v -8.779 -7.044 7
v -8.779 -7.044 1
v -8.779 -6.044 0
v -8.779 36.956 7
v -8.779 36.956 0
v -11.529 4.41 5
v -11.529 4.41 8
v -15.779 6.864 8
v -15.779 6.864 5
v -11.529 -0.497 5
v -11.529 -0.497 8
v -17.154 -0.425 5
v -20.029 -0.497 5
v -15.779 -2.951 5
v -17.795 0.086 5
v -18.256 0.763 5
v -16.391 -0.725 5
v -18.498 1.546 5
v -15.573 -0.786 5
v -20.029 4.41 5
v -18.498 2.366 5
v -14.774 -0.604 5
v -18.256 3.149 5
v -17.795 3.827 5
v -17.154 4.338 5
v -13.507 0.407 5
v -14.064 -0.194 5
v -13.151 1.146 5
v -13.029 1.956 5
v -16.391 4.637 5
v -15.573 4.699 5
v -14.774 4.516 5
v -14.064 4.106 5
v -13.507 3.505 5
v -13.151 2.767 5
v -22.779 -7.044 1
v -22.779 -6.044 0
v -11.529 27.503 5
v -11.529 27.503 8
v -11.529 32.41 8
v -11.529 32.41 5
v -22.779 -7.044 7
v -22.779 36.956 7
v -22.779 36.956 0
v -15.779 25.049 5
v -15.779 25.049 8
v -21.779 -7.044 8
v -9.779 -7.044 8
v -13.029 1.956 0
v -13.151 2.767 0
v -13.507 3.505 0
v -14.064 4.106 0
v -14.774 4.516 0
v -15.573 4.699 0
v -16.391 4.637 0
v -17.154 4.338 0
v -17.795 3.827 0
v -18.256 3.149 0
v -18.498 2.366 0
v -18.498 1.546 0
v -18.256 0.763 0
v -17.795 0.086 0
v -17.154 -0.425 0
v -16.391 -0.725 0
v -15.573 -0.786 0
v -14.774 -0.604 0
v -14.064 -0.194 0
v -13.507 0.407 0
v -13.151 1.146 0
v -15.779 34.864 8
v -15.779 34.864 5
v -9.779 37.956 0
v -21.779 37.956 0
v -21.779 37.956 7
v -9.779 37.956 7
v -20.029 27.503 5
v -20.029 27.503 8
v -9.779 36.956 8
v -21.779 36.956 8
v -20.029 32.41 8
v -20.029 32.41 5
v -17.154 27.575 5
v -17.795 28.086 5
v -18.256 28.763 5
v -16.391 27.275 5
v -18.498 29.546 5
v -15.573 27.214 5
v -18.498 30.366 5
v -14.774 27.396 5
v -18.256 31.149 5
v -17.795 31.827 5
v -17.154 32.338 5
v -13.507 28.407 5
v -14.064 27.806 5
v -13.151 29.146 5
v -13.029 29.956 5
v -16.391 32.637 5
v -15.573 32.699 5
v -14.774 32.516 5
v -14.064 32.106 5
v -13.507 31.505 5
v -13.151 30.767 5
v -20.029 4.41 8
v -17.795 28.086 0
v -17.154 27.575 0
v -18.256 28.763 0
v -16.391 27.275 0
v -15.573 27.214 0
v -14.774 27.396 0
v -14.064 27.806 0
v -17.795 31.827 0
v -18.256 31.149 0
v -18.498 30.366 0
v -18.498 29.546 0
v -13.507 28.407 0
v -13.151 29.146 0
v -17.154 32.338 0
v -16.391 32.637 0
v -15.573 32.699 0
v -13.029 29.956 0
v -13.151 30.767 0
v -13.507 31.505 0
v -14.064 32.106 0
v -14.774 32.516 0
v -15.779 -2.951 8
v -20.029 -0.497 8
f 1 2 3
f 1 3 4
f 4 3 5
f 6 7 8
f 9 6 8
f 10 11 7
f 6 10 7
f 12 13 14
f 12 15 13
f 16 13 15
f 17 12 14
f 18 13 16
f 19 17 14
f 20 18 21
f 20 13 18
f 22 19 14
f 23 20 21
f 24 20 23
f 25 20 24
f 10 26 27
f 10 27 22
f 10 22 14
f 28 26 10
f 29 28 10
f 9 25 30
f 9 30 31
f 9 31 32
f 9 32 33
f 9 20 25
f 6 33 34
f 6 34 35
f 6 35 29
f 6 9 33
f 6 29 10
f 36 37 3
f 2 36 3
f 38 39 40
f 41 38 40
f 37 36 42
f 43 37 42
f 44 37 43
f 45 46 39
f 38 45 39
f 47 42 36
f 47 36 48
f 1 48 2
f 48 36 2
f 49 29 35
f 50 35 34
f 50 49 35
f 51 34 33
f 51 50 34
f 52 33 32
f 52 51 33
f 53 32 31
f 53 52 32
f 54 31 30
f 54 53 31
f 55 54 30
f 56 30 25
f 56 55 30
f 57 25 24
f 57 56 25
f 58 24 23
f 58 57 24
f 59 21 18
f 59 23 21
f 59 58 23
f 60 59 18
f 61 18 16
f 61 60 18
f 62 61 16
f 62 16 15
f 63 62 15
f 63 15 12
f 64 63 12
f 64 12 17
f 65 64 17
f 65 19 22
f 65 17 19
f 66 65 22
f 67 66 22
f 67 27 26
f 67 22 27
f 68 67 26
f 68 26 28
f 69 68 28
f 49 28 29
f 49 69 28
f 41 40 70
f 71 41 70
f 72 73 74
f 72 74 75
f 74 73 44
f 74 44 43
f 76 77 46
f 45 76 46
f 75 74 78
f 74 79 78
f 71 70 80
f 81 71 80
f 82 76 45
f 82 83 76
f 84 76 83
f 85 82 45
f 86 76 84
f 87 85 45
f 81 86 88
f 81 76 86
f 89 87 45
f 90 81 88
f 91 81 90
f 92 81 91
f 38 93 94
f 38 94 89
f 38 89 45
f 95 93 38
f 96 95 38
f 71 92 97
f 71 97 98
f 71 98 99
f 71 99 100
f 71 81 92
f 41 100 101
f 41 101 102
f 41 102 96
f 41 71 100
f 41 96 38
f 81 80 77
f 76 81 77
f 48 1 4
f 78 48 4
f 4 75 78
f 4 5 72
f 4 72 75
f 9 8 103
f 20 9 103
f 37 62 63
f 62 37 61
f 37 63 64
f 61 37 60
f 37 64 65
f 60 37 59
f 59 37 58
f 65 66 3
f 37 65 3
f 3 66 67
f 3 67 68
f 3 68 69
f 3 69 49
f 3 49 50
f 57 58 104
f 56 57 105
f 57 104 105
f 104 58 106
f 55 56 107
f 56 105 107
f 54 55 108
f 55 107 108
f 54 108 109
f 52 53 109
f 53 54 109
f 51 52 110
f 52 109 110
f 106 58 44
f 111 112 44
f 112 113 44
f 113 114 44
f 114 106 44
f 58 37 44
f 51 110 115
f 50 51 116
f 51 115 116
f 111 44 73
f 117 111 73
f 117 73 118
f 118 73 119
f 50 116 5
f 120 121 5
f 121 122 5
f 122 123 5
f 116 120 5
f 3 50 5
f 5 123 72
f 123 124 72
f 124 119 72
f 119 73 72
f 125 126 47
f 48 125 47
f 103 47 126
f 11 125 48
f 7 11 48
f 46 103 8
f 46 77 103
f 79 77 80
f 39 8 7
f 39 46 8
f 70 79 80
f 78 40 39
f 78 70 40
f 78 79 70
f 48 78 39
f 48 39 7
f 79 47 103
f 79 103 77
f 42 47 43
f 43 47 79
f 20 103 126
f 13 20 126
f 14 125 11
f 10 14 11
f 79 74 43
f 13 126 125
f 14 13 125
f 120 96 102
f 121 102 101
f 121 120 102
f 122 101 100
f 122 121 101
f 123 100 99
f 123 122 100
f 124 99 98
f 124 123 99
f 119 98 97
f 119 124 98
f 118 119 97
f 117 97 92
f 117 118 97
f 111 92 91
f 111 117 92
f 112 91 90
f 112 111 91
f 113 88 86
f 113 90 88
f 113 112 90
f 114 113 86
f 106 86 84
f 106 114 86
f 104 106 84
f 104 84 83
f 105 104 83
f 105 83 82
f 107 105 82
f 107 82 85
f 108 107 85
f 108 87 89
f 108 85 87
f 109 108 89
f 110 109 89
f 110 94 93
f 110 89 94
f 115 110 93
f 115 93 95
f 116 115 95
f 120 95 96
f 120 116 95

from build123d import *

# Parameters (mm, degrees)
F0_W     = 14
F0_H     = 45
F0_R     = 2.75
F1_DEPTH = 8
F3_DEPTH = 3
F4_SIZE  = 1


with BuildPart() as f1:
    # F0 (on Top) → F1 (new body)
    with BuildSketch(Plane.XY):
        with Locations((-15.778726, 15.456292)):
            Rectangle(F0_W, F0_H)
        with Locations((-15.778726, 1.956292)):
            Circle(F0_R, mode=Mode.SUBTRACT)
        with Locations((-15.778726, 29.956292)):
            Circle(F0_R, mode=Mode.SUBTRACT)
    extrude(amount=F1_DEPTH)

    # F2 (on face) → F3 (cut)
    with BuildSketch(Plane.XY.offset(8)):
        Polygon((-11.528726, 27.502553), (-11.528726, 32.41003), (-15.778726, 34.863769), (-20.028726, 32.41003), (-20.028726, 27.502553), (-15.778726, 25.048814), align=None)
        Polygon((-11.528726, -0.497447), (-11.528726, 4.41003), (-15.778726, 6.863769), (-20.028726, 4.41003), (-20.028726, -0.497447), (-15.778726, -2.951186), align=None)
    extrude(amount=-F3_DEPTH, mode=Mode.SUBTRACT)

    # F4
    f4_edges = [f1.edges().sort_by_distance(p)[0] for p in [
        (-15.778726, 37.956292, 8),
        (-8.778726, 37.956292, 4),
        (-22.778726, 37.956292, 4),
        (-15.778726, -7.043708, 0),
        (-8.778726, 15.456292, 8),
        (-22.778726, 15.456292, 8),
    ]]
    chamfer(f4_edges, length=F4_SIZE)


solid = f1.part
